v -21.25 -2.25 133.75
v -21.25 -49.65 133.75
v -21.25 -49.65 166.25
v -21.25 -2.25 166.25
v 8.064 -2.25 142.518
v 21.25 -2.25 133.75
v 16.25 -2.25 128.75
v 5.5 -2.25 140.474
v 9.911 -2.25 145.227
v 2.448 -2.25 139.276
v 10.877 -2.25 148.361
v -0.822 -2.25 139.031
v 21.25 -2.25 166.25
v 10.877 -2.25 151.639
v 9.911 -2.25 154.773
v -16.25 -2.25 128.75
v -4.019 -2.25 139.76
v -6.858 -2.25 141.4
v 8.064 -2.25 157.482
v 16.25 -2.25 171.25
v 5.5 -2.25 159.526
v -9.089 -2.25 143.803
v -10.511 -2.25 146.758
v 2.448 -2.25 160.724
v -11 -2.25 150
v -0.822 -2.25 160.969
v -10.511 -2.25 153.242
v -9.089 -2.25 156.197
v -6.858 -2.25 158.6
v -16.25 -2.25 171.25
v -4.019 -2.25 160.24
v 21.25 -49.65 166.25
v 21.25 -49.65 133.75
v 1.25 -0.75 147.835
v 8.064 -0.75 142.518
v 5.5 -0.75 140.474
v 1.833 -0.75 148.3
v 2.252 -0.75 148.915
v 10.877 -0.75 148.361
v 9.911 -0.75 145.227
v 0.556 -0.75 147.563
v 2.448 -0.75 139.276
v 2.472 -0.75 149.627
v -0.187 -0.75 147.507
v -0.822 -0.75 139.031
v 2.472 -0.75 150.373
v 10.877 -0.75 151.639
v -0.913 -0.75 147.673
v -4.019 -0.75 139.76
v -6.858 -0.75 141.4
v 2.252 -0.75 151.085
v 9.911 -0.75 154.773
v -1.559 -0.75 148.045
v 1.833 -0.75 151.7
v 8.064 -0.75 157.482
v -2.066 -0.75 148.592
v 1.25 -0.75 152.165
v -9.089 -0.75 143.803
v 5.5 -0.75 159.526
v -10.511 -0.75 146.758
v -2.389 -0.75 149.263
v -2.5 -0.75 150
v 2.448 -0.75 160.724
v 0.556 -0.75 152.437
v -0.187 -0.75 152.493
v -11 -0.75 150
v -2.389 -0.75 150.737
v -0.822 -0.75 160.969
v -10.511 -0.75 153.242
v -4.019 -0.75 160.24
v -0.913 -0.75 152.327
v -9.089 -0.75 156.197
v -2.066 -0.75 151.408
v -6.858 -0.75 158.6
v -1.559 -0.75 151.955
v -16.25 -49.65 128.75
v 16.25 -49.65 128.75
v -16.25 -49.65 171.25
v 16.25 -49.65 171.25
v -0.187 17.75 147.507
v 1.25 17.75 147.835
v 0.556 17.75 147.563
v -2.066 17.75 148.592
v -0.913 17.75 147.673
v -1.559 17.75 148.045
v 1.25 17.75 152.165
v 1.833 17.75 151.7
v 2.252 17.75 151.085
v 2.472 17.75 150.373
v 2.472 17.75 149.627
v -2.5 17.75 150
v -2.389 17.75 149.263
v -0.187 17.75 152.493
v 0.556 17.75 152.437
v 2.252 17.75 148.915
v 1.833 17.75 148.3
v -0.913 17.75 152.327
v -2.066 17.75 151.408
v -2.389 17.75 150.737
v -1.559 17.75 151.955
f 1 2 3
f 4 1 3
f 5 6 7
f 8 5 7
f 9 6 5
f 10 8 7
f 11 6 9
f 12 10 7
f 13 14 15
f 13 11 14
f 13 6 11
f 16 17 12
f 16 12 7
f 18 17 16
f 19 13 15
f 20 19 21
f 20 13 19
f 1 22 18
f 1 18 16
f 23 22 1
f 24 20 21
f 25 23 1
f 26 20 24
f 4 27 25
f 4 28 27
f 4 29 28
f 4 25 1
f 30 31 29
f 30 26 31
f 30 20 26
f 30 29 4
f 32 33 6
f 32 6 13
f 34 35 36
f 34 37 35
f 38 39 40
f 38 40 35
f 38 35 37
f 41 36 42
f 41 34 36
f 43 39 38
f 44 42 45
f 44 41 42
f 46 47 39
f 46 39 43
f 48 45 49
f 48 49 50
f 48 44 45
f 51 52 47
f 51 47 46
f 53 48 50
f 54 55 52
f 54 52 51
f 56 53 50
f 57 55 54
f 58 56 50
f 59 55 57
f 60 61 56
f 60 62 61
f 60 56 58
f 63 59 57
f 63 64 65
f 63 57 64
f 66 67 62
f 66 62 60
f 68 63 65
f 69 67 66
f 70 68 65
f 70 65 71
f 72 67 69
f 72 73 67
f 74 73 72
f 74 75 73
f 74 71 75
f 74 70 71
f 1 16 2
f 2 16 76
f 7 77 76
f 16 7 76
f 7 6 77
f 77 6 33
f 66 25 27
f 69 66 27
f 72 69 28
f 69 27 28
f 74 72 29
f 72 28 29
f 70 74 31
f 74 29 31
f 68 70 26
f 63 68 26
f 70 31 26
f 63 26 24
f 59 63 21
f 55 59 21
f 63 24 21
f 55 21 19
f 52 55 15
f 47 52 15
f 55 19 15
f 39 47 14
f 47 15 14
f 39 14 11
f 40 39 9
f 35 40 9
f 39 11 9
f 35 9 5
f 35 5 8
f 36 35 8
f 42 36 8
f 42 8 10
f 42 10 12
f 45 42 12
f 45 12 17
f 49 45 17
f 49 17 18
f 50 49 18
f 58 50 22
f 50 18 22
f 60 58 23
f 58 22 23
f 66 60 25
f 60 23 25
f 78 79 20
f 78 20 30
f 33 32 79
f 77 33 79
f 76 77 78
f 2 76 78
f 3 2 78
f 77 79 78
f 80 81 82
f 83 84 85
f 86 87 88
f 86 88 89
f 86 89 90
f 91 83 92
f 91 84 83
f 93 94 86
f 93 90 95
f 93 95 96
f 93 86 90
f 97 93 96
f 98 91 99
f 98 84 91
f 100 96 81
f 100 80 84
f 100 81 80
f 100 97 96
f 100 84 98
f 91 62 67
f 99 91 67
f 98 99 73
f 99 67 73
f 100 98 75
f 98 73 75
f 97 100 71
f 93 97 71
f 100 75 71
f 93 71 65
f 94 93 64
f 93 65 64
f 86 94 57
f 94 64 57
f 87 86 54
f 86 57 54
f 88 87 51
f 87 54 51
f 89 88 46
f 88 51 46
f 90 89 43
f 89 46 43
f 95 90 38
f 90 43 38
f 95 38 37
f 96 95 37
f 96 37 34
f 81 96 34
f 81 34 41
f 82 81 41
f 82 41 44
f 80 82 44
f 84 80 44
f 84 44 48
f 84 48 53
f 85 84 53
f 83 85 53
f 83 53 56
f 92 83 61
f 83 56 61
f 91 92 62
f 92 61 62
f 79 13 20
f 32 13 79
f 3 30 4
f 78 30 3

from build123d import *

# Parameters (mm, degrees)
SKETCH045_W             = 42.5
SKETCH045_H             = 42.5
PAD015_DEPTH            = 47.4
CHAMFER009_SIZE         = 5
CHAMFER008_SIZE         = 5
CHAMFER010_SIZE         = 5
CHAMFER011_SIZE         = 5
SKETCH047_R             = 11
PAD016_DEPTH            = 1.5
SKETCH046_R             = 2.5
PAD014_DEPTH            = 18.5
BODY010_PLACEMENT_ANGLE = 180


with BuildPart() as part:
    # Sketch045 → Pad015 (new body)
    with BuildSketch(Plane.XZ):
        Rectangle(SKETCH045_W, SKETCH045_H)
    extrude(amount=-PAD015_DEPTH)

    # Chamfer009
    chamfer009_edges = [part.edges().sort_by_distance(p)[0] for p in [
        (21.25, 23.7, 21.25),
    ]]
    chamfer(chamfer009_edges, length=CHAMFER009_SIZE)

    # Chamfer008
    chamfer008_edges = [part.edges().sort_by_distance(p)[0] for p in [
        (-21.25, 23.7, 21.25),
    ]]
    chamfer(chamfer008_edges, length=CHAMFER008_SIZE)

    # Chamfer010
    chamfer010_edges = [part.edges().sort_by_distance(p)[0] for p in [
        (21.25, 23.7, -21.25),
    ]]
    chamfer(chamfer010_edges, length=CHAMFER010_SIZE)

    # Chamfer011
    chamfer011_edges = [part.edges().sort_by_distance(p)[0] for p in [
        (-21.25, 23.7, -21.25),
    ]]
    chamfer(chamfer011_edges, length=CHAMFER011_SIZE)

    # Sketch047 (on Face1 of Chamfer011) → Pad016 (join)
    with BuildSketch(Plane.XZ):
        Circle(SKETCH047_R)
    extrude(amount=PAD016_DEPTH)

    # Sketch046 (on Face12 of Pad016) → Pad014 (join)
    with BuildSketch(Plane.XZ.offset(1.5)):
        Circle(SKETCH046_R)
    extrude(amount=PAD014_DEPTH)


with BuildPart() as part_1:
    # Body010 placement: moved
    add(part.part.moved(Location((0, -2.25, 150))).rotate(Axis((0, -2.25, 150), (0, 0, 1)), BODY010_PLACEMENT_ANGLE))


solid = part_1.part
